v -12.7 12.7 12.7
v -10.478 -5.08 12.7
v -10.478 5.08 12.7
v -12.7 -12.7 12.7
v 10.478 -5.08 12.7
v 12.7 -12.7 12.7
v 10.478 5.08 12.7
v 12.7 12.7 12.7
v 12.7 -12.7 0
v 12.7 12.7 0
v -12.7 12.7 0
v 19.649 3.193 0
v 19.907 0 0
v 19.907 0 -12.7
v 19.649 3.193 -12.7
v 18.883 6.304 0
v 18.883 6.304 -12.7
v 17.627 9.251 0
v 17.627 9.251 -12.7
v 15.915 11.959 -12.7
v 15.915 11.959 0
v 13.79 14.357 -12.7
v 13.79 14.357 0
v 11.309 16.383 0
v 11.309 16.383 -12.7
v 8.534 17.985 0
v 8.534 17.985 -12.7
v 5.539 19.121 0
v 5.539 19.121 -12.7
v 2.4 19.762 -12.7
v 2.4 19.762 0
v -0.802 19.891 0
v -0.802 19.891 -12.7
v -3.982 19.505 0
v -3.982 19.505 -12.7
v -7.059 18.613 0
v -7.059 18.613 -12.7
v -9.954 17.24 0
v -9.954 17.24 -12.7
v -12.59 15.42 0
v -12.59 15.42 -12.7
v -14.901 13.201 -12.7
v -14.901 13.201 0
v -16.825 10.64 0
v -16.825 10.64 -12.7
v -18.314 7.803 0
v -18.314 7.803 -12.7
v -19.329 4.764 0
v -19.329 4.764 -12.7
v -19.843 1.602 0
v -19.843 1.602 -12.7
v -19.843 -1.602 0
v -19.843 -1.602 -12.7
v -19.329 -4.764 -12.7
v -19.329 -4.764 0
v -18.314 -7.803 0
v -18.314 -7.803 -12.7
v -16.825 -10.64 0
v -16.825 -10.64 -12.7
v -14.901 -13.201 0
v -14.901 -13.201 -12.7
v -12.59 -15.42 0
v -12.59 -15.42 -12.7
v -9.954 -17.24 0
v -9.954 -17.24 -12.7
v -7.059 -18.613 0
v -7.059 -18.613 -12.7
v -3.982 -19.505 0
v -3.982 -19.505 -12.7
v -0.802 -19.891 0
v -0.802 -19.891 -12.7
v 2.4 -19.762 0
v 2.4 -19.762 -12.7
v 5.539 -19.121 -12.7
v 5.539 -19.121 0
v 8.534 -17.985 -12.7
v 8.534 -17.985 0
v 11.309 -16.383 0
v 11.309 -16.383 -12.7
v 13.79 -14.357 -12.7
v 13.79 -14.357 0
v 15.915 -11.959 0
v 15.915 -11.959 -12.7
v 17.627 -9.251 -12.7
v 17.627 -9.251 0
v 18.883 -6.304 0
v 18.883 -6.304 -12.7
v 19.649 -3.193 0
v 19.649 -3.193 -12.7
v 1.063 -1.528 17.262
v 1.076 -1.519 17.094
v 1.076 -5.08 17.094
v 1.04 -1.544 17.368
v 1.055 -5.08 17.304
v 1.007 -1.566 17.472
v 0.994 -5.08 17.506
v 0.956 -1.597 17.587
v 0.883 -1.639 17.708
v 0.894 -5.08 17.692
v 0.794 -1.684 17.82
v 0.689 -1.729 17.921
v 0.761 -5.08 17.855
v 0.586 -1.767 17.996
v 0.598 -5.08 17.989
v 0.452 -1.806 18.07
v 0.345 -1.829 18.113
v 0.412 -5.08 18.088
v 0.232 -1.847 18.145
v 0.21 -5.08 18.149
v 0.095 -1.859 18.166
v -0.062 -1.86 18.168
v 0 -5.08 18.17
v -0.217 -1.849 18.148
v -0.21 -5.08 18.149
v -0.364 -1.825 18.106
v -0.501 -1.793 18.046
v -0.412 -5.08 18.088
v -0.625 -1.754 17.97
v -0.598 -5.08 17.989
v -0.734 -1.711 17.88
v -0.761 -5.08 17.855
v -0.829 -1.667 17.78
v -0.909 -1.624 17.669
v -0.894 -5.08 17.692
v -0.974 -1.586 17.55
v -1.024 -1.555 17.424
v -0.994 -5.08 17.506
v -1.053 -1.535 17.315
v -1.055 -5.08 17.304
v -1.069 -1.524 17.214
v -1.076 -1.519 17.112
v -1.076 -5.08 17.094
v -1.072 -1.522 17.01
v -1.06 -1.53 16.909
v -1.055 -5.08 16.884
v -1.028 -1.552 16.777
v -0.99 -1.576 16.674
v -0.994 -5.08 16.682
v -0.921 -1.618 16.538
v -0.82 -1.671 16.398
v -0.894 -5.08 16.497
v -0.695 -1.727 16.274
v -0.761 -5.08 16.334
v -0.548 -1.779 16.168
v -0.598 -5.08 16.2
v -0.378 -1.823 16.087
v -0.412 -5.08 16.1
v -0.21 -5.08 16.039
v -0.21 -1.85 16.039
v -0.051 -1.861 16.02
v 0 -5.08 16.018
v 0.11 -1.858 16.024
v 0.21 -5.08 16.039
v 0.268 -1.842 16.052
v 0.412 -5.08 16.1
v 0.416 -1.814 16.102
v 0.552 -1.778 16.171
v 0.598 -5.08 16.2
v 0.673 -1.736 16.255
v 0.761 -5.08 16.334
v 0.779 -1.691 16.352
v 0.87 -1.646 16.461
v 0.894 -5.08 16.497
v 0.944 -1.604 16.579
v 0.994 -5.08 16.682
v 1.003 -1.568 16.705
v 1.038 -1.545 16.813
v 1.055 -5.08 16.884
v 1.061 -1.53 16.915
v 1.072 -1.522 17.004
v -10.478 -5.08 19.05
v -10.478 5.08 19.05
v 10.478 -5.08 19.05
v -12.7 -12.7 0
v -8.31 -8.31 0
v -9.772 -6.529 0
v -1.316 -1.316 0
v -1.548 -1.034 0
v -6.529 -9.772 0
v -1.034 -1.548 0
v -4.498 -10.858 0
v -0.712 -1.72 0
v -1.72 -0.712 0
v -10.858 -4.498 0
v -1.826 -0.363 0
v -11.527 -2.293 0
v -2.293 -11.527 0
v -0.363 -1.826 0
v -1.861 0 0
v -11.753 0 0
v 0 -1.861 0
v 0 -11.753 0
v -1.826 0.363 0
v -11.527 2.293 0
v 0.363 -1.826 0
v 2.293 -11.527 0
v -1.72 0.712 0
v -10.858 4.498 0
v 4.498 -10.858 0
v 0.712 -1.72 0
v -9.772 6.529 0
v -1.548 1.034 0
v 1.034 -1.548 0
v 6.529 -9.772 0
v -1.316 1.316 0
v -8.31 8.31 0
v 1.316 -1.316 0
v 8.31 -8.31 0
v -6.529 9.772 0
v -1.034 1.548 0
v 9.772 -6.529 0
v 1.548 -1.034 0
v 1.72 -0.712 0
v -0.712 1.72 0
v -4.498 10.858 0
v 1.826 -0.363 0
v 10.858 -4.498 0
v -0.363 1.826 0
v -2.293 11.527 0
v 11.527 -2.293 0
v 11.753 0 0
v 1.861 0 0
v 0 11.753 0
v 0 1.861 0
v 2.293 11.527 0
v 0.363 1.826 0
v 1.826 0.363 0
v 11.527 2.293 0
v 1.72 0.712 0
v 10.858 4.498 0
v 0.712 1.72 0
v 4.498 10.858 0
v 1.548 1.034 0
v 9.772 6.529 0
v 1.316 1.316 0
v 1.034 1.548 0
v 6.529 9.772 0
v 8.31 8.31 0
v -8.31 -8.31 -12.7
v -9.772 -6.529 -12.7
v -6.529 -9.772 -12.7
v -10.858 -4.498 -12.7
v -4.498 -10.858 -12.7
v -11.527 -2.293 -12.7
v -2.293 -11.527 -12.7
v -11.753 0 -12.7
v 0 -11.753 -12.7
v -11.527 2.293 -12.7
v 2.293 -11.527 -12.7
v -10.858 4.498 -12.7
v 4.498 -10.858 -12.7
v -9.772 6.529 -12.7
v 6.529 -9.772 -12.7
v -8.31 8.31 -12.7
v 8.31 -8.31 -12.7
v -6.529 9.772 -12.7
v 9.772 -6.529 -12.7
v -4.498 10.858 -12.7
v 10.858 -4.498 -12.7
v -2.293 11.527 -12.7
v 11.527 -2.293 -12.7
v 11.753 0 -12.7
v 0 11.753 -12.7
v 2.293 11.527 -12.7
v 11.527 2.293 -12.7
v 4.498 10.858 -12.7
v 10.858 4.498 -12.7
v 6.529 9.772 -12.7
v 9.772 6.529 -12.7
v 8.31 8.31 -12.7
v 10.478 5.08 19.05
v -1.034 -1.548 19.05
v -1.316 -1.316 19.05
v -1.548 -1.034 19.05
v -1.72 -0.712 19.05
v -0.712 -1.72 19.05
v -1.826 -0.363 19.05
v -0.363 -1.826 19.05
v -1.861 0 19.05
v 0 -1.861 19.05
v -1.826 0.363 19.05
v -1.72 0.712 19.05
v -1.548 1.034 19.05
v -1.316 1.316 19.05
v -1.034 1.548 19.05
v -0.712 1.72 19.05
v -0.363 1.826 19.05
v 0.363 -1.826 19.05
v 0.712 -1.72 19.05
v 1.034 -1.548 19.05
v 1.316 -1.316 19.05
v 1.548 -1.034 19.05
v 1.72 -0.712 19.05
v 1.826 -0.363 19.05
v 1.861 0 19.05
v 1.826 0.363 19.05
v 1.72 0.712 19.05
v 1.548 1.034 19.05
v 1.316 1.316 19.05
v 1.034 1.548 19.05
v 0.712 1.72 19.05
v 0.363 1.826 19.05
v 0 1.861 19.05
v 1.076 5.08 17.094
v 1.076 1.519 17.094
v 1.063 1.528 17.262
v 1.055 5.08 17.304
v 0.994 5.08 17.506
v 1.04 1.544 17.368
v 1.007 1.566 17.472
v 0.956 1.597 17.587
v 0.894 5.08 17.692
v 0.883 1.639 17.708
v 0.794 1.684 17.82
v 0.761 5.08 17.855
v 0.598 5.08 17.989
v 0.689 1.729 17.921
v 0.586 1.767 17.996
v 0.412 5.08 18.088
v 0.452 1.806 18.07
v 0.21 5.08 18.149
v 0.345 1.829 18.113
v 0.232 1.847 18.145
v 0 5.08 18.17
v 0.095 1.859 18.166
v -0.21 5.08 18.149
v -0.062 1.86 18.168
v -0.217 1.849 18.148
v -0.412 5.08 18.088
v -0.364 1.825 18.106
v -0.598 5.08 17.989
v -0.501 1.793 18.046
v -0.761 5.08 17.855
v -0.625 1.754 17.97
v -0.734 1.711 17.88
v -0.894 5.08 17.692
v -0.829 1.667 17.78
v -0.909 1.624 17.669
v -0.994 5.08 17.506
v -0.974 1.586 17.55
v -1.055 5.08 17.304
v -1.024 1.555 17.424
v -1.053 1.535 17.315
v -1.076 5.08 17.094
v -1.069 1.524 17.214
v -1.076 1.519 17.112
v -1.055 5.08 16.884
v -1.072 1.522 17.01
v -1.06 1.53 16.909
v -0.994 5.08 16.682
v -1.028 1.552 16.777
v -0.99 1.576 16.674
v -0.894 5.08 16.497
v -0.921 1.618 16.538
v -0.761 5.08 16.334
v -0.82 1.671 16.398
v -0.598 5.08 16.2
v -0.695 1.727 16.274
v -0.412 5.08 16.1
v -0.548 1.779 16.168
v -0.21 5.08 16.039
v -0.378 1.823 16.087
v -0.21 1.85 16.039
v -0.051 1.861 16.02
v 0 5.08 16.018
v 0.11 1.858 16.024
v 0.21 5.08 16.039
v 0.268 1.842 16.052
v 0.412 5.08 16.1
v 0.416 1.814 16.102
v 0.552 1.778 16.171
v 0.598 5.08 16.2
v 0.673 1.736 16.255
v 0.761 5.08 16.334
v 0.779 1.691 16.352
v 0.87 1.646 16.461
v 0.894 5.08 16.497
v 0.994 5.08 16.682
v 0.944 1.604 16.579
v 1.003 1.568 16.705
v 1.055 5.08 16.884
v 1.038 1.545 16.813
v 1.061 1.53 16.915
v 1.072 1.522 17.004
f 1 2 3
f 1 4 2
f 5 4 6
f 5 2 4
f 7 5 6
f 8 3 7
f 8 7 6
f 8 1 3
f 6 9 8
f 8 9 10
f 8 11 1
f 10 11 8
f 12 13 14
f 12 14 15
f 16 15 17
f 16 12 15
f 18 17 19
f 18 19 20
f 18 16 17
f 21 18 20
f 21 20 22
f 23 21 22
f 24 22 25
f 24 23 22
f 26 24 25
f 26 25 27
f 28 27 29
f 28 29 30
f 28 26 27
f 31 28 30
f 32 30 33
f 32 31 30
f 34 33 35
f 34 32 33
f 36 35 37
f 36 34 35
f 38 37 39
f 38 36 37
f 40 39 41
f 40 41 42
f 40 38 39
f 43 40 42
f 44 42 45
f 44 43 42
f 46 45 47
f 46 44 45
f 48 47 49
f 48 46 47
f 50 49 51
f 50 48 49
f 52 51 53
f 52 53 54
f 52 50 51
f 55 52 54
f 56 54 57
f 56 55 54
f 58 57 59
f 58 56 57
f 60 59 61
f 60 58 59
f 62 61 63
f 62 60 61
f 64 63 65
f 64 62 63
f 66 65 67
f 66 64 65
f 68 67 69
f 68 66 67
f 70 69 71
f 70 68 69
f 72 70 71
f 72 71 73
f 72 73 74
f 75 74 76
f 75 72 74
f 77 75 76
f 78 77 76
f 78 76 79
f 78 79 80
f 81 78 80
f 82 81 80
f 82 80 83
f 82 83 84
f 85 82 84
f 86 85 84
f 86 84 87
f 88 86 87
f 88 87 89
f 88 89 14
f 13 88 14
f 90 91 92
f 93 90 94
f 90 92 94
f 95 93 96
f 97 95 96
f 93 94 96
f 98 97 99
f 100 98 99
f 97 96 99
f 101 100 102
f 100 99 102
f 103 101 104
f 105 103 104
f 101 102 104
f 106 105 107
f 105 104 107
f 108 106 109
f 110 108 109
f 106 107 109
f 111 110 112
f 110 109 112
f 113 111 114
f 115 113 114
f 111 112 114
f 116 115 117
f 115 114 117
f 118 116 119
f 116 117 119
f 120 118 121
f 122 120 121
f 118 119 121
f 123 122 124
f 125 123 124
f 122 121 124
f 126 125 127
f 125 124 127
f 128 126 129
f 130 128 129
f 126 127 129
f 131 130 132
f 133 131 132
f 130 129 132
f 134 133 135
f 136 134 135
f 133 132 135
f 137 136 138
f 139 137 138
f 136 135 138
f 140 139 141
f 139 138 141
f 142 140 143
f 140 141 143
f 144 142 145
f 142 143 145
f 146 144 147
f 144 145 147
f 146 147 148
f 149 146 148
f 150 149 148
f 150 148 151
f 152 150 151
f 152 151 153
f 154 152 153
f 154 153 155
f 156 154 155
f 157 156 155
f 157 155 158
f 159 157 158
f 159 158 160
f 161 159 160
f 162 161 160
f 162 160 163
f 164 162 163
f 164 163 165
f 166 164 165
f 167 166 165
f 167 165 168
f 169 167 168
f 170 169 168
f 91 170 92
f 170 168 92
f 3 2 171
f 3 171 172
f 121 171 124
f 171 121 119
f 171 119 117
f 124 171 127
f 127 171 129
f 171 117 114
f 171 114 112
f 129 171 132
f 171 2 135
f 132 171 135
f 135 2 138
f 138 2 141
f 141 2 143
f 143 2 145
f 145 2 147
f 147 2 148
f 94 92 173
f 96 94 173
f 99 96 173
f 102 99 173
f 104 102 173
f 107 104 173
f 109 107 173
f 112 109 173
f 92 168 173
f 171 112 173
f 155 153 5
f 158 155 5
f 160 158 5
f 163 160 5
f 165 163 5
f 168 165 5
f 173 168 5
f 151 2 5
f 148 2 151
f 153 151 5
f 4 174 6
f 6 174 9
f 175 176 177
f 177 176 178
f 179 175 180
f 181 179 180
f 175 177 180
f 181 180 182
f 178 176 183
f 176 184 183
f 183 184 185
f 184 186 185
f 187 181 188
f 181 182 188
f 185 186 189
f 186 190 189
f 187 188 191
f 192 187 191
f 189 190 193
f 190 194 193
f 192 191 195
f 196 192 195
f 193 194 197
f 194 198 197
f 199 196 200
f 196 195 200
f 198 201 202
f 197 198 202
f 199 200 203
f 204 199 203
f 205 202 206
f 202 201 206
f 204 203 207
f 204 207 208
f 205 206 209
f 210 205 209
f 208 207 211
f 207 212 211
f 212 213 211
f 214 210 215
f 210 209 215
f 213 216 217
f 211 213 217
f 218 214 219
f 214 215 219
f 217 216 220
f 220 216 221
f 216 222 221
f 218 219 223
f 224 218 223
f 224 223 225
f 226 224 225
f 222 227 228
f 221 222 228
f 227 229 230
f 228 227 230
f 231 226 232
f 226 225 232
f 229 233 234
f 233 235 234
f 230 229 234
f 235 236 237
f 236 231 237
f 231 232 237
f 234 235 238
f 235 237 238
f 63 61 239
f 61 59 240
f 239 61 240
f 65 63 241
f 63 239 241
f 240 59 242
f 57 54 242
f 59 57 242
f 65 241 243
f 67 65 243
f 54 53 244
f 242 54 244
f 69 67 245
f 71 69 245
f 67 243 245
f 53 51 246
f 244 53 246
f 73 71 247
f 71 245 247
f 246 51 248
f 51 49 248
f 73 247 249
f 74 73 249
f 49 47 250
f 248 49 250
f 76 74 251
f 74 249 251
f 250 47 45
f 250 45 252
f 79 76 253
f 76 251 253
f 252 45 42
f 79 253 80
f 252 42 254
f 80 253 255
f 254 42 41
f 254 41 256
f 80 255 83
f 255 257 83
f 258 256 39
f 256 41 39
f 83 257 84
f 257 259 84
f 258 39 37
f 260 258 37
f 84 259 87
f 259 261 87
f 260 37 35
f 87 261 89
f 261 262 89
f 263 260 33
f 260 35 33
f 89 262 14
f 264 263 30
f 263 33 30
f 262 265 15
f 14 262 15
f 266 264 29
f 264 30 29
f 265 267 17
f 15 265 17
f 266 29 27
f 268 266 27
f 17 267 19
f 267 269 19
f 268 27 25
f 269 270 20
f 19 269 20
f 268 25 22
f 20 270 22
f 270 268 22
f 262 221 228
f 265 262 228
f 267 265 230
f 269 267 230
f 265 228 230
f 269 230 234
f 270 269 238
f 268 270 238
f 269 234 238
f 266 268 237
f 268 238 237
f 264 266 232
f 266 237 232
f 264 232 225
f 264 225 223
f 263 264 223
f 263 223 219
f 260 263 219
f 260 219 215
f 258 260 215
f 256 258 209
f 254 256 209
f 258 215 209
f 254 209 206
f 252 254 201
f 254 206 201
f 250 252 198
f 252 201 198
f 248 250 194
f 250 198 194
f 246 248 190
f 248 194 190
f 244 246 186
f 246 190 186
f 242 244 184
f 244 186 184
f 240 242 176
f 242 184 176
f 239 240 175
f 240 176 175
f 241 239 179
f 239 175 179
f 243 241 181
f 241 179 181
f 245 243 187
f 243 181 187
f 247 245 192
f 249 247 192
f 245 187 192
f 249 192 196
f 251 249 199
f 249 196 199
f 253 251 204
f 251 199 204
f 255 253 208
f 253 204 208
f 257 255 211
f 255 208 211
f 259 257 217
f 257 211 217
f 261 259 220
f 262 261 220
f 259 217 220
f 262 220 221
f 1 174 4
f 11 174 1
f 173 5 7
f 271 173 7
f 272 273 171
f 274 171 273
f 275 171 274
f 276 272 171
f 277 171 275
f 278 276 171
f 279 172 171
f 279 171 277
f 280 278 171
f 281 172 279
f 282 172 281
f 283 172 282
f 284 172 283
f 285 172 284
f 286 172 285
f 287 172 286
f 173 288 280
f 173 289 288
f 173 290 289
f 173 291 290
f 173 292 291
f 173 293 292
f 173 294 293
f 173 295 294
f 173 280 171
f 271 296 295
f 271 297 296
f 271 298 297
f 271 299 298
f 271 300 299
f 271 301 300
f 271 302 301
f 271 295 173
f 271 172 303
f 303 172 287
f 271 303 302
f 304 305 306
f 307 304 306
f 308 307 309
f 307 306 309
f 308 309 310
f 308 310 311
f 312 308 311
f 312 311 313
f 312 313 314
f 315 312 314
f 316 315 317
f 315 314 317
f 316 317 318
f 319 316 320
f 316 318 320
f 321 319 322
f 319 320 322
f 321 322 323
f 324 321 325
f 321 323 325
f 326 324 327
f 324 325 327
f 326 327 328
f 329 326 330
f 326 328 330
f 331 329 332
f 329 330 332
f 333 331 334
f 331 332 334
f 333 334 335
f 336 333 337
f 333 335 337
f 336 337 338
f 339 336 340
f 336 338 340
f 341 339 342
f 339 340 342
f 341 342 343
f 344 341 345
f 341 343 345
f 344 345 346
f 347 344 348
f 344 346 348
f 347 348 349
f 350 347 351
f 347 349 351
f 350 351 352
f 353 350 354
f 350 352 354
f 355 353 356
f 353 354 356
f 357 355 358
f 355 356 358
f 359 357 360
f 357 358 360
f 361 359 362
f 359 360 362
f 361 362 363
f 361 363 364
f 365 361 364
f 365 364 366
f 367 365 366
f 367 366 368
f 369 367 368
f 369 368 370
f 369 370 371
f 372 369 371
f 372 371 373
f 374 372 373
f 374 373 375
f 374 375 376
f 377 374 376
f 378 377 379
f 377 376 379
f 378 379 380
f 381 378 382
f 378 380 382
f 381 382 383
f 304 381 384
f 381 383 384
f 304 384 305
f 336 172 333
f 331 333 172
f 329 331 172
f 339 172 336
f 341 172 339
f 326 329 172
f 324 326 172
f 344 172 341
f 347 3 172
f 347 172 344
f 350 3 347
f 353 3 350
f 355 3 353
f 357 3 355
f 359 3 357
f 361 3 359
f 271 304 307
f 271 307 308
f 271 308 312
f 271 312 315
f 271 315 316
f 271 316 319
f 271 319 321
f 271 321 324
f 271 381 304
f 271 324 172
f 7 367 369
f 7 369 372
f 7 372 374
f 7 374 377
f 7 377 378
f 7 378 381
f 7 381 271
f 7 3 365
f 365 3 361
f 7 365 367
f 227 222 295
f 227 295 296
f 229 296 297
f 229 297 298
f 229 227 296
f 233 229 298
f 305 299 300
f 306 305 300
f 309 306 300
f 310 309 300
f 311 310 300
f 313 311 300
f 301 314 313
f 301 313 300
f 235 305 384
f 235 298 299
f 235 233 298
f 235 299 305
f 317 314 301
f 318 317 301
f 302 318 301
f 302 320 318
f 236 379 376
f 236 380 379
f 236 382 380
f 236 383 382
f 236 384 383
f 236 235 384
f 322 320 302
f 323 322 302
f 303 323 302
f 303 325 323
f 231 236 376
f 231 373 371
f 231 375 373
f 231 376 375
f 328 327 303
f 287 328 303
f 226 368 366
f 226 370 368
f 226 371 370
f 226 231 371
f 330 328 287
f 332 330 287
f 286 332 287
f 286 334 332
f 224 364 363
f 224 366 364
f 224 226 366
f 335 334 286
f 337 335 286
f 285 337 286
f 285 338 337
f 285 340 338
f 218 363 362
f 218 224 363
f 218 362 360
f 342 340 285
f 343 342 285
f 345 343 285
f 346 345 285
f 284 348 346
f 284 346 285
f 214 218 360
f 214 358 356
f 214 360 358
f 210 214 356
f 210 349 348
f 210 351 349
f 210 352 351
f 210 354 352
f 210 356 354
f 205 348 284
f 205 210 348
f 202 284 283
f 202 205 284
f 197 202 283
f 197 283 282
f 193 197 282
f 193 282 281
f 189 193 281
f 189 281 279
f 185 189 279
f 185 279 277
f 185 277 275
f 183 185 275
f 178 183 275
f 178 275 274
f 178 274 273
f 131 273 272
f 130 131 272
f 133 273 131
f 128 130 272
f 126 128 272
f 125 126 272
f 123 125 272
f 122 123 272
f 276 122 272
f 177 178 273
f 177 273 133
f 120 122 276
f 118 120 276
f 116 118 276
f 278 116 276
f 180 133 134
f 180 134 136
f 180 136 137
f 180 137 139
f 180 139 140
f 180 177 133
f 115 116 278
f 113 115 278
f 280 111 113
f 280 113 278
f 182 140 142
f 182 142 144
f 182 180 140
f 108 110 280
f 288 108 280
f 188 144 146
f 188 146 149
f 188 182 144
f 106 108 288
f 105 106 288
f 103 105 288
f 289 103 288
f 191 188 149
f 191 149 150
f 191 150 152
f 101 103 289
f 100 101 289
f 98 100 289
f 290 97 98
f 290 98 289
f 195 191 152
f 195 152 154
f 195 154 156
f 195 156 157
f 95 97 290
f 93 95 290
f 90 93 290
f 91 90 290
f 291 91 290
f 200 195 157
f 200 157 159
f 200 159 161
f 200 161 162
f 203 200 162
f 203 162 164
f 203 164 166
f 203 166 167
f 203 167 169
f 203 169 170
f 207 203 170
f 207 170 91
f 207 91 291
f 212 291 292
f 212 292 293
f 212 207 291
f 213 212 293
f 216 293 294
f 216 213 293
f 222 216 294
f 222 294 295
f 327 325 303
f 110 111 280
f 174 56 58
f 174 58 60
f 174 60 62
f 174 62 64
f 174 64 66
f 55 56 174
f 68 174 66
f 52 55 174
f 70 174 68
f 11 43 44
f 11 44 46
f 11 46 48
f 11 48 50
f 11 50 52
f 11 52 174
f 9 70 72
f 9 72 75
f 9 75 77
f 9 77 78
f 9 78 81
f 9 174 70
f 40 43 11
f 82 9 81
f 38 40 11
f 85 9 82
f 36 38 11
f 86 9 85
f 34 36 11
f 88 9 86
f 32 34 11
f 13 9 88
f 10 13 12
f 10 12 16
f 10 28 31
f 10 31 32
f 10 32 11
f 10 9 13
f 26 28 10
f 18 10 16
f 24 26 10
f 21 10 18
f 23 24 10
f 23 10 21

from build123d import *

# Parameters (mm, degrees)
F1_R      = 19.907119
F2_DEPTH  = 12.7
F0_R      = 11.75258
F3_DEPTH  = 12.7
F4_W      = 25.4
F4_H      = 25.4
F5_DEPTH  = 12.7
F6_W      = 20.955
F6_H      = 10.16
F7_DEPTH  = 19.05
F8_R      = 1.075724
F9_DEPTH  = 5.715
F10_R     = 1.861497
F11_DEPTH = 19.05


with BuildPart() as f2:
    # F1 (on Top) → F2 (new body)
    with BuildSketch(Plane.XY):
        Circle(F1_R)
    extrude(amount=-F2_DEPTH)

    # F0 (on Top) → F3 (cut)
    with BuildSketch(Plane.XY):
        Circle(F0_R)
    extrude(amount=-F3_DEPTH, mode=Mode.SUBTRACT)

    # F4 (on Top) → F5 (join)
    with BuildSketch(Plane.XY):
        Rectangle(F4_W, F4_H)
    extrude(amount=F5_DEPTH)

    # F6 (on Top) → F7 (join)
    with BuildSketch(Plane.XY):
        Rectangle(F6_W, F6_H)
    extrude(amount=F7_DEPTH)

    # F8 (on Front) → F9 (cut, symmetric)
    with BuildSketch(Plane.XZ):
        with Locations((0, 17.094158)):
            Circle(F8_R)
    extrude(amount=F9_DEPTH, both=True, mode=Mode.SUBTRACT)

    # F10 (on Top) → F11 (cut)
    with BuildSketch(Plane.XY):
        Circle(F10_R)
    extrude(amount=F11_DEPTH, mode=Mode.SUBTRACT)


solid = f2.part
